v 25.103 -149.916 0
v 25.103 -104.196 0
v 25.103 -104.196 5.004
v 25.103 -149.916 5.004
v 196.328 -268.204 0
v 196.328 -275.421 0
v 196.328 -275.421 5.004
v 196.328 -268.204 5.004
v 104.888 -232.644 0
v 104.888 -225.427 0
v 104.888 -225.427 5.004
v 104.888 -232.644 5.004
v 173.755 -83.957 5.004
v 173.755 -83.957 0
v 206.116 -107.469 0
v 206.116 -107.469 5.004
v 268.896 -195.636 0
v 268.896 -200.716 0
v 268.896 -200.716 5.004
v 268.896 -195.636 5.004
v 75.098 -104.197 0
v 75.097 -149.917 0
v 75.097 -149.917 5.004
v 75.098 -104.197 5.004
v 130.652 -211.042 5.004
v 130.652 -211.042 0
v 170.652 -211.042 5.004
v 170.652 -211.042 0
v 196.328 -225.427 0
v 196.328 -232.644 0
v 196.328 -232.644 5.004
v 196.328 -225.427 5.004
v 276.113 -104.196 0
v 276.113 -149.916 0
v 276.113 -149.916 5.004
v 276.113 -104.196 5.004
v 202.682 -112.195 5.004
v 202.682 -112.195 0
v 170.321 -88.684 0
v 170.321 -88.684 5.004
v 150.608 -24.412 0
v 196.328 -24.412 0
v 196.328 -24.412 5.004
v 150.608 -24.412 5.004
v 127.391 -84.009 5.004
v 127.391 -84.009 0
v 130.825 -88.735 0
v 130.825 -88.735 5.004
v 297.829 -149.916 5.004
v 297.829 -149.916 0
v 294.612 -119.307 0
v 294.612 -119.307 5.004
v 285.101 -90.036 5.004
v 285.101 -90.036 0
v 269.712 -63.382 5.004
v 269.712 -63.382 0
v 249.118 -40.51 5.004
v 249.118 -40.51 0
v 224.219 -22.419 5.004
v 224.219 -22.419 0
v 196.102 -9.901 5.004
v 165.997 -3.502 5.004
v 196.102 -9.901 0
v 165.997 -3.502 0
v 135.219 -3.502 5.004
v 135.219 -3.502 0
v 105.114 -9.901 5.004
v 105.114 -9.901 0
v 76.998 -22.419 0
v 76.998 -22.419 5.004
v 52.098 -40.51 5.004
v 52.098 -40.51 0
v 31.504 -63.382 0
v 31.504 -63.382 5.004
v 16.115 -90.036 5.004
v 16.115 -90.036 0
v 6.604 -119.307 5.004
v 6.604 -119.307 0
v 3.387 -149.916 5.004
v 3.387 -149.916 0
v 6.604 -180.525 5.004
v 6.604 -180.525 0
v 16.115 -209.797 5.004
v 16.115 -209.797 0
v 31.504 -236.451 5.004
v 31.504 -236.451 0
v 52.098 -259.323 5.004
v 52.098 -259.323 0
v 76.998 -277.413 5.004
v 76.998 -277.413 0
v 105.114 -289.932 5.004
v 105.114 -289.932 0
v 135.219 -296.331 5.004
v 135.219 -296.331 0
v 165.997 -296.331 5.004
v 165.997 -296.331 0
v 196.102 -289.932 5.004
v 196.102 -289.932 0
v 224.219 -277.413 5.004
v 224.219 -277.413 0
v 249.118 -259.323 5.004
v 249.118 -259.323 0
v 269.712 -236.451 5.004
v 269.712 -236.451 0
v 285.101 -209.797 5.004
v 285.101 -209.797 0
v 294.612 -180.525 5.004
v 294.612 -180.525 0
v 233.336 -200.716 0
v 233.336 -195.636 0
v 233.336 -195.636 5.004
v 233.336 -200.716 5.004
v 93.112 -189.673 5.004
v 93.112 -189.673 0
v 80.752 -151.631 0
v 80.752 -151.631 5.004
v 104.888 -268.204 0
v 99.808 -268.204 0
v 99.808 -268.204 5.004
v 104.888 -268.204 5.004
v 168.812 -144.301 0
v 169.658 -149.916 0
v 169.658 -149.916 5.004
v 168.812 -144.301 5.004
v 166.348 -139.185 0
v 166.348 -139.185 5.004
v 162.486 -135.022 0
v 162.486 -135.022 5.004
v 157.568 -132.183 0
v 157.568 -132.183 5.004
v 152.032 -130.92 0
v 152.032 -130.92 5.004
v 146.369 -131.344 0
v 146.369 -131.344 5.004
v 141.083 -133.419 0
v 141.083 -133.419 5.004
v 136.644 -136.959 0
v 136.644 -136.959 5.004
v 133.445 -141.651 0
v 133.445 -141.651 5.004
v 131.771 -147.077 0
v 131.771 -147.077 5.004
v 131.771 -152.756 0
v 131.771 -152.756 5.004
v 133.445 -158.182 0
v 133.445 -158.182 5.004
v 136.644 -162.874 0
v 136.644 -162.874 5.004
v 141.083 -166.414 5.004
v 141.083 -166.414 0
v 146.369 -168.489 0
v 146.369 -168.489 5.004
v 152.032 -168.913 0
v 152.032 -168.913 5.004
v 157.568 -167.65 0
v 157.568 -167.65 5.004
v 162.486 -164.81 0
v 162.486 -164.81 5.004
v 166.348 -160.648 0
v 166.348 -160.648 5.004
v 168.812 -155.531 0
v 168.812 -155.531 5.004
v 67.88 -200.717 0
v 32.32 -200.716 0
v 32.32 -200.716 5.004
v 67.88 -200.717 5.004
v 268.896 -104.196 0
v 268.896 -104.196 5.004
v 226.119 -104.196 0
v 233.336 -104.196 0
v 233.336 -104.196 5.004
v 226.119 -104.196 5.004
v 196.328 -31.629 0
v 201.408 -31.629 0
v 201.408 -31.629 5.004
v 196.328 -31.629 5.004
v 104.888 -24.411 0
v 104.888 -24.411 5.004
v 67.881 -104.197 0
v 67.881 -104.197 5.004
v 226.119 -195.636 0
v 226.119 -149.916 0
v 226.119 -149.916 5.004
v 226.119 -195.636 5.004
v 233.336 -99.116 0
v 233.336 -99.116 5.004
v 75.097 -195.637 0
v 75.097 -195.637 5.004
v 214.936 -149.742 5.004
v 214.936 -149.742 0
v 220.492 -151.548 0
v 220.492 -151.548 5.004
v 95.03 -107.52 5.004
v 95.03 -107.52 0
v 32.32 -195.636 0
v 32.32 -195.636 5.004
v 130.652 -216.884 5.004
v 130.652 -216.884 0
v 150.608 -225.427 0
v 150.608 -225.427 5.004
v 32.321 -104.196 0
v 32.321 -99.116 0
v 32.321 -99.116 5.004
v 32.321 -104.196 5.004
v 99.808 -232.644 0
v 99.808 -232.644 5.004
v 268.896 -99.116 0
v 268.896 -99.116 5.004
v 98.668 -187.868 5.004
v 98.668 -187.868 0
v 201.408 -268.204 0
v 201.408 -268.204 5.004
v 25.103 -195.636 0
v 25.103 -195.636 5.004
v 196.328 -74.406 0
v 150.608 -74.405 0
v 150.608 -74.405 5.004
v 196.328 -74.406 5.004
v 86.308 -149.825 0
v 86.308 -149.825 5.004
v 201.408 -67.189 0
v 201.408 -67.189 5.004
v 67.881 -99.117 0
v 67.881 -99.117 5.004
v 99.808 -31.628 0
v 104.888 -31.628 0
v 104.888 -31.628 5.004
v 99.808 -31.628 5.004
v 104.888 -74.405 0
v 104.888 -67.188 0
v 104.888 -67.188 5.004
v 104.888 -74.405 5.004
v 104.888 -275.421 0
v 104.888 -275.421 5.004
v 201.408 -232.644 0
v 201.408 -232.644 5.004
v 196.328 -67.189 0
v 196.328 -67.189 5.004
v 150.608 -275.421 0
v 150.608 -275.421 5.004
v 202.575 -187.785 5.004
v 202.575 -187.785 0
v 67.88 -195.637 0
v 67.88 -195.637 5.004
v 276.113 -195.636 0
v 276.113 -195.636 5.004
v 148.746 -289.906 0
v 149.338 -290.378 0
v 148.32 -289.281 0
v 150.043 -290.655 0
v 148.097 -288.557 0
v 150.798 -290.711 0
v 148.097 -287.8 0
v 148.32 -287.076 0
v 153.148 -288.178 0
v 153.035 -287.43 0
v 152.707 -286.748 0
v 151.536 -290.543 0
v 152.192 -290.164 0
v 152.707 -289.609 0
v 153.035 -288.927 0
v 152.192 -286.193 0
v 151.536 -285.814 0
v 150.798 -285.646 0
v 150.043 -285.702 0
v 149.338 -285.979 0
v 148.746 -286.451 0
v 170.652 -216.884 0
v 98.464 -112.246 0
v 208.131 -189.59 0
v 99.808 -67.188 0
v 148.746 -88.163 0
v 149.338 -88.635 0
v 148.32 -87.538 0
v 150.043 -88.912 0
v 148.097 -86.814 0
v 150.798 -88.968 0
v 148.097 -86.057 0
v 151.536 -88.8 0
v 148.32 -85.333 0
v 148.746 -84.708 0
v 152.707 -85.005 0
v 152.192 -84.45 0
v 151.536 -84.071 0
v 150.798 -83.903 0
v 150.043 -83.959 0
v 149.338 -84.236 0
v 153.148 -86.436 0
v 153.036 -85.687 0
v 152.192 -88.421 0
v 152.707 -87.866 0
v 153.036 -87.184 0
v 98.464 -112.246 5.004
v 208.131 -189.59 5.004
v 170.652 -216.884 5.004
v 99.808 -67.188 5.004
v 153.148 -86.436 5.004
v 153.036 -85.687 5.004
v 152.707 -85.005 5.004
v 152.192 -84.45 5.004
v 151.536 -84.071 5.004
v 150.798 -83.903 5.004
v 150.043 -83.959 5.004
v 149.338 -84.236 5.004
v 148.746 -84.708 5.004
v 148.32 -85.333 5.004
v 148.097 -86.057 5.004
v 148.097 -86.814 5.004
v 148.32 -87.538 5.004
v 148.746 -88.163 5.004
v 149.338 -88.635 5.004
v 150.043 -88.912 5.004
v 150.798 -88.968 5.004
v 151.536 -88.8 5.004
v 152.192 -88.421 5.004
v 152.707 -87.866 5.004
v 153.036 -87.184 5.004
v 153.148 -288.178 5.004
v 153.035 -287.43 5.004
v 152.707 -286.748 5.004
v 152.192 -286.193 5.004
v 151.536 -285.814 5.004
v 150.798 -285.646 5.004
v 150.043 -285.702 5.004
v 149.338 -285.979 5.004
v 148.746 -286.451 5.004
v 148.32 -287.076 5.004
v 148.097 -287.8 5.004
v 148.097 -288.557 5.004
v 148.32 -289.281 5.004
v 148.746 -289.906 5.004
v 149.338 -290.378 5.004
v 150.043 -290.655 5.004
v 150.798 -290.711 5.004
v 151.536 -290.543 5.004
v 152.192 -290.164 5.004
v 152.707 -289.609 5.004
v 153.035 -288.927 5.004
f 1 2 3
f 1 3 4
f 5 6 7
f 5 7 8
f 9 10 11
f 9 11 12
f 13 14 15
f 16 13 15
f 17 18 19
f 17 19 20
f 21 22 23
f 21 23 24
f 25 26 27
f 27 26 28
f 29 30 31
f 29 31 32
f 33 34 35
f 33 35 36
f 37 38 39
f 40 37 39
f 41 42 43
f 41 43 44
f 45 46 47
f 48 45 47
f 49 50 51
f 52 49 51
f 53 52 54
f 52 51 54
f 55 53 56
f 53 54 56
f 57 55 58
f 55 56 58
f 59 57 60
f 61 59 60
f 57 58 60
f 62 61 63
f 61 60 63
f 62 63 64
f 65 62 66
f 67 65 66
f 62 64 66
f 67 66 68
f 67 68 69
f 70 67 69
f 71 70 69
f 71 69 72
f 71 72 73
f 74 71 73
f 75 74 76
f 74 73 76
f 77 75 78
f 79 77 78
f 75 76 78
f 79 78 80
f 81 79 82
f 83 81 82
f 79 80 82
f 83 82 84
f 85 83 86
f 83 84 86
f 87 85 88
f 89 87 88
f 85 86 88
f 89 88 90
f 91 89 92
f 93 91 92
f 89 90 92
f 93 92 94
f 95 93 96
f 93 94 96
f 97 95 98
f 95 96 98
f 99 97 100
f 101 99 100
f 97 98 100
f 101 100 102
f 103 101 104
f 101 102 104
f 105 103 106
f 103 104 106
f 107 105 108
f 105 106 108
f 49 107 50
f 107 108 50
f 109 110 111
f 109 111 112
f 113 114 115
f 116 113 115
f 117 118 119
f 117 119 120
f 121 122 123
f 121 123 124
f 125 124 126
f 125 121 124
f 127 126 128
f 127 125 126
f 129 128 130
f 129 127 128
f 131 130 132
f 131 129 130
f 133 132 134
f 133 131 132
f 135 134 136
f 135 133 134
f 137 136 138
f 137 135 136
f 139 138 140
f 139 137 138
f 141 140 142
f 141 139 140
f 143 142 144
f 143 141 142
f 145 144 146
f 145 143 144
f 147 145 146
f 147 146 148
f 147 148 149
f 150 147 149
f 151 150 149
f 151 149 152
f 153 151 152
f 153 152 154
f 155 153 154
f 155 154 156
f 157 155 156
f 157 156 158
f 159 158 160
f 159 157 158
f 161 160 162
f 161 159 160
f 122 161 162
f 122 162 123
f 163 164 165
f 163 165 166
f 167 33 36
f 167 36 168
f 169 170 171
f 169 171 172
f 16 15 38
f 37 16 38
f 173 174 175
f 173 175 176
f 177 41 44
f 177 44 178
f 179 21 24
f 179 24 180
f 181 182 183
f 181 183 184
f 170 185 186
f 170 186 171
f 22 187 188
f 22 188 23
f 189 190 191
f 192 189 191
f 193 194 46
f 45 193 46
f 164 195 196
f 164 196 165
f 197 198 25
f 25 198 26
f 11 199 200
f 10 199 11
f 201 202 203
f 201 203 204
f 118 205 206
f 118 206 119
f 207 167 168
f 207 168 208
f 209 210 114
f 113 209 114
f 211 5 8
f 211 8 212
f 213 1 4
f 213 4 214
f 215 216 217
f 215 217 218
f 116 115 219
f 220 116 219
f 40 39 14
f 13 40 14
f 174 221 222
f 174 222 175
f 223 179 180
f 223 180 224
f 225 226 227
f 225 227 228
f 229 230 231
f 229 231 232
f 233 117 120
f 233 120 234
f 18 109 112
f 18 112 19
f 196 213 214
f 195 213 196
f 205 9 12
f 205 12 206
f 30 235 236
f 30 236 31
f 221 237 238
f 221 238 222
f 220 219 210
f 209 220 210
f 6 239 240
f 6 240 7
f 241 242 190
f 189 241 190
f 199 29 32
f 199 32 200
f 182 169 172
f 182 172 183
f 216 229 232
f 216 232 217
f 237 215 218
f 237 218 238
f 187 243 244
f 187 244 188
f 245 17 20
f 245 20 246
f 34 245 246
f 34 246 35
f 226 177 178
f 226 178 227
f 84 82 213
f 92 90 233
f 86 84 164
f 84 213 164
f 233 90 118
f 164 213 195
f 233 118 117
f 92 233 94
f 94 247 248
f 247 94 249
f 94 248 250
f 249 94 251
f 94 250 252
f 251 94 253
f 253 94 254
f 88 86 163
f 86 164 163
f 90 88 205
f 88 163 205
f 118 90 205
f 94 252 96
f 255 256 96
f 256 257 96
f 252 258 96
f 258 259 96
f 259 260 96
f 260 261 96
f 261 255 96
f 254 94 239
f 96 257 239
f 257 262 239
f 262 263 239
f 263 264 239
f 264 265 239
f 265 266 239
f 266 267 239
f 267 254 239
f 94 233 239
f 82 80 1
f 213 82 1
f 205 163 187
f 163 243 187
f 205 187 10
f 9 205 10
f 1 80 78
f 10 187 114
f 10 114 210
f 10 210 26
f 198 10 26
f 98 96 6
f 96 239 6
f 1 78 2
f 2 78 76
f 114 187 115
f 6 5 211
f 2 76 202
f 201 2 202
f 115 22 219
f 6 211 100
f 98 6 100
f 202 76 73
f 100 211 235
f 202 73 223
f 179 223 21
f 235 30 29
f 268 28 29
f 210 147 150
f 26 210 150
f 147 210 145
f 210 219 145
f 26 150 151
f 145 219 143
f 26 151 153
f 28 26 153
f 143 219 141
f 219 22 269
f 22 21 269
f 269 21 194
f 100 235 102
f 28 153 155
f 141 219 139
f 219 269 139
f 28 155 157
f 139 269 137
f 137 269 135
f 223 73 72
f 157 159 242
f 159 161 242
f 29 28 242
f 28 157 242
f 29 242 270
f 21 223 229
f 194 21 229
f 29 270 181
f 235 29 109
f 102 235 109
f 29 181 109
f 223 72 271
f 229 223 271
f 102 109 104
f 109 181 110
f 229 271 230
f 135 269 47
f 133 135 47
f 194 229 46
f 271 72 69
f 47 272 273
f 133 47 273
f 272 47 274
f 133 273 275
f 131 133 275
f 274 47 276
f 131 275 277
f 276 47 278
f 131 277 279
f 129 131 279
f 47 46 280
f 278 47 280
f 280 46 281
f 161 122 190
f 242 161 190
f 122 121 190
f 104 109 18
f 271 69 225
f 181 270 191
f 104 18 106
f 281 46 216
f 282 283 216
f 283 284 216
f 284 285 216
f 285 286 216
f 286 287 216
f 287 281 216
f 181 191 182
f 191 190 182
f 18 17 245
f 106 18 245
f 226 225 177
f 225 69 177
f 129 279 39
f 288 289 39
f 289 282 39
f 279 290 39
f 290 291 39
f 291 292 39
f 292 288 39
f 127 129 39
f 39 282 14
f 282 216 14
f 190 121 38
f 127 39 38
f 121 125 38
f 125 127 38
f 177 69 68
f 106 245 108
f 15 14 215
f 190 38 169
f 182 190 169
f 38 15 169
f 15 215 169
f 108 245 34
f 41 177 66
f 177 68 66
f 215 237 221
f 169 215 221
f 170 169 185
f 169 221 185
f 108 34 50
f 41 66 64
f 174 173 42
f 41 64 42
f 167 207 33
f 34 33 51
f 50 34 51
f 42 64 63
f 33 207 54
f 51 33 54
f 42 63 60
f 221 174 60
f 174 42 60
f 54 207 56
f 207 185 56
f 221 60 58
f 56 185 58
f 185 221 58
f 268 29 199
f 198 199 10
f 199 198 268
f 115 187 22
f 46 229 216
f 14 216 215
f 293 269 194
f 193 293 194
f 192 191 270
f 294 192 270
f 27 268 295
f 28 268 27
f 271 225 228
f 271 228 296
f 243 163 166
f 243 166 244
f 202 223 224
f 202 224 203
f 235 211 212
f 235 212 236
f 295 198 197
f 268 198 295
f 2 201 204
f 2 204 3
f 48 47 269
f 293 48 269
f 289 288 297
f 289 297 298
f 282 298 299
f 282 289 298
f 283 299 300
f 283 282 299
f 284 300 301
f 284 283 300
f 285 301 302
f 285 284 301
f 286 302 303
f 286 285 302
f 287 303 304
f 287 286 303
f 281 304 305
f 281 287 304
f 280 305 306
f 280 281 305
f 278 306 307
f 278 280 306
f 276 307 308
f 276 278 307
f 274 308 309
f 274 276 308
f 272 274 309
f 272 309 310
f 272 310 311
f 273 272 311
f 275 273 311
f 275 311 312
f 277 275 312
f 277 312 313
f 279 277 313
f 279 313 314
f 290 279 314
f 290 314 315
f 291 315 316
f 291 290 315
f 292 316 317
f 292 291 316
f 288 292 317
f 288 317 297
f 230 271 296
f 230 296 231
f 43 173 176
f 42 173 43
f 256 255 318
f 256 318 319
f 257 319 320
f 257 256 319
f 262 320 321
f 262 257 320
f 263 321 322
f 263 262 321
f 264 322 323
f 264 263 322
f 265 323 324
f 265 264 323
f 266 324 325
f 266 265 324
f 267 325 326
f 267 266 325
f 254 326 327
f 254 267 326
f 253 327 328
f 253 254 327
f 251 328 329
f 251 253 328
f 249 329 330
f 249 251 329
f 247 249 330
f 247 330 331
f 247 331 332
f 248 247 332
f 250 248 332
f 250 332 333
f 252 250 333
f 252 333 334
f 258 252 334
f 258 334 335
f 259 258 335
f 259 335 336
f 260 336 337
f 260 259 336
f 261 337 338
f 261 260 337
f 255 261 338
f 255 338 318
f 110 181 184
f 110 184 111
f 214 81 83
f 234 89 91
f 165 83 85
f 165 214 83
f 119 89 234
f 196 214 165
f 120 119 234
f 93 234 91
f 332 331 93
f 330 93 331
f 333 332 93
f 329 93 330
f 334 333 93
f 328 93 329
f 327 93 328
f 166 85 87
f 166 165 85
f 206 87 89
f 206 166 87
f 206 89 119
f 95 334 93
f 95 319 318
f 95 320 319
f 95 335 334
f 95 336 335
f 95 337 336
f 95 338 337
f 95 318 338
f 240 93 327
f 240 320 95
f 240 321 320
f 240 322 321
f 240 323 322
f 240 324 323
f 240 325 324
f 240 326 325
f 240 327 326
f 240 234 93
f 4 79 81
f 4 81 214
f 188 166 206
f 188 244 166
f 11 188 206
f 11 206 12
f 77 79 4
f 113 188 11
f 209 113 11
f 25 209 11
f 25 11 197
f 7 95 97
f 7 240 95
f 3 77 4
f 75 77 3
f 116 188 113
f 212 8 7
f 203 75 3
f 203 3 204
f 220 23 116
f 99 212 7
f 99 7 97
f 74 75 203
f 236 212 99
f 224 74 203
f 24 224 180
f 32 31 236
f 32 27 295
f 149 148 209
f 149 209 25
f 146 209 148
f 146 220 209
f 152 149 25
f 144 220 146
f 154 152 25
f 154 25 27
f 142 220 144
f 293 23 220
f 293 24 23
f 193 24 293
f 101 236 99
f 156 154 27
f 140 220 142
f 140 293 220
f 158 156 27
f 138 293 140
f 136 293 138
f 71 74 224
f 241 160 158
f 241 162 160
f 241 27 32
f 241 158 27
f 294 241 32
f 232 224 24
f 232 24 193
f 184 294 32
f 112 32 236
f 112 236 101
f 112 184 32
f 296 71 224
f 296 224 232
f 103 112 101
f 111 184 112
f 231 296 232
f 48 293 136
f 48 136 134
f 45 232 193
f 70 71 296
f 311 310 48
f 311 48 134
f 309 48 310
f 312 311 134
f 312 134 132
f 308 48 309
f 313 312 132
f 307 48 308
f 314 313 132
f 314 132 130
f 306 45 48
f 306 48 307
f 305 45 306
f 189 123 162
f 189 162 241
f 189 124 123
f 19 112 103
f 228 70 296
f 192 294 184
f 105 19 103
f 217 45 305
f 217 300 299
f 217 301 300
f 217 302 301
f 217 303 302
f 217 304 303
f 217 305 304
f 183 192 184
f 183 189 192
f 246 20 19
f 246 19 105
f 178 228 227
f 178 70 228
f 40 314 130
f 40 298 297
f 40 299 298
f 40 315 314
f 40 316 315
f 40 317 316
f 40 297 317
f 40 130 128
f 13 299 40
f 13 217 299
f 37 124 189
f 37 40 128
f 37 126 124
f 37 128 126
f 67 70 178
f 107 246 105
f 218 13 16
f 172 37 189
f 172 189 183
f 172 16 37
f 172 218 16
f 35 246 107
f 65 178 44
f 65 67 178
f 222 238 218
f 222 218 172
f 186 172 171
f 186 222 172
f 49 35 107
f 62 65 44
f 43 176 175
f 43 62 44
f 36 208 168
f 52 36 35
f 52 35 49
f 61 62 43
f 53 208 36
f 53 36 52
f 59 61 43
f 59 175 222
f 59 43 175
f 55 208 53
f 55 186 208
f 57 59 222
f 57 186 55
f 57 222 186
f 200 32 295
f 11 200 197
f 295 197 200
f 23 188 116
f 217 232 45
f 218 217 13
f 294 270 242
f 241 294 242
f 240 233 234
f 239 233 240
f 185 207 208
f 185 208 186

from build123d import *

# Parameters (mm, degrees)
MODEL_R             = 147.220888612
MODEL_R_2           = 2.54
MODEL_R_3           = 19.05
MODEL_W             = 40.000341048
MODEL_H             = 5.842
BOSS_EXTRUDE1_DEPTH = 5.0038


with BuildPart() as part:
    # Model → Boss-Extrude1 (new body)
    with BuildSketch(Plane.XY):
        with Locations((150.608180965, -149.916372011)):
            Circle(MODEL_R)
        with Locations((150.608180965, -288.178437552)):
            Circle(MODEL_R_2, mode=Mode.SUBTRACT)
        with Locations((150.608180965, -149.916372011)):
            Circle(MODEL_R_3, mode=Mode.SUBTRACT)
        with Locations((150.608395424, -86.435544776)):
            Circle(MODEL_R_2, mode=Mode.SUBTRACT)
        Polygon((75.097257942, -195.636586469), (75.097257942, -149.916586488), (75.097650189, -104.19658647), (67.880551818, -104.196555511), (67.880573609, -99.116555511), (32.320573609, -99.116402971), (32.320551818, -104.196402971), (25.103453446, -104.196372012), (25.103453446, -149.916371999), (25.103061199, -195.636372011), (32.32015957, -195.63640297), (32.320137779, -200.71640297), (67.880137779, -200.71655551), (67.88015957, -195.63655551), align=None, mode=Mode.SUBTRACT)
        with Locations((150.651713387, -213.962635212)):
            Rectangle(MODEL_W, MODEL_H, mode=Mode.SUBTRACT)
        Polygon((93.11237376, -189.673088704), (80.751588595, -151.630503696), (86.307660763, -149.825226415), (98.668445928, -187.867811423), align=None, mode=Mode.SUBTRACT)
        Polygon((95.030114956, -107.520111007), (127.391070645, -84.008500452), (130.824912089, -88.734777734), (98.4639564, -112.246388288), align=None, mode=Mode.SUBTRACT)
        Polygon((196.328395424, -225.427295034), (150.608395424, -225.427295034), (104.888395425, -225.426902787), (104.888364466, -232.644001159), (99.808364466, -232.643979367), (99.808211925, -268.203979367), (104.888211925, -268.204001158), (104.888180966, -275.42109953), (150.608180967, -275.42109953), (196.328180965, -275.421491778), (196.328211924, -268.204393406), (201.408211924, -268.204415197), (201.408364465, -232.644415198), (196.328364465, -232.644393406), align=None, mode=Mode.SUBTRACT)
        Polygon((104.887966507, -74.405448987), (150.607966472, -74.405448987), (196.327966506, -74.405841235), (196.327997465, -67.188742863), (201.407997465, -67.188764655), (201.408150006, -31.628764655), (196.328150006, -31.628742863), (196.328180965, -24.411644492), (150.608181003, -24.411644492), (104.888180965, -24.411252244), (104.888150006, -31.628350616), (99.808150007, -31.628328824), (99.807997466, -67.188328824), (104.887997466, -67.188350615), align=None, mode=Mode.SUBTRACT)
        Polygon((226.119103989, -104.196157552), (226.119103989, -149.916157498), (226.118711741, -195.636157551), (233.335810113, -195.63618851), (233.335788322, -200.71618851), (268.895788321, -200.716341051), (268.895810113, -195.636341051), (276.112908485, -195.63637201), (276.112908485, -149.916372061), (276.113300732, -104.196372011), (268.89620236, -104.196341052), (268.896224152, -99.116341052), (233.336224152, -99.116188511), (233.336202361, -104.196188511), align=None, mode=Mode.SUBTRACT)
        Polygon((173.754854348, -83.957325021), (206.115810037, -107.468935576), (202.681968593, -112.195212857), (170.321012904, -88.683602302), align=None, mode=Mode.SUBTRACT)
        Polygon((220.491677852, -151.547700109), (208.130892687, -189.590285117), (202.574820519, -187.785007836), (214.935605684, -149.742422828), align=None, mode=Mode.SUBTRACT)
    extrude(amount=BOSS_EXTRUDE1_DEPTH)


solid = part.part
